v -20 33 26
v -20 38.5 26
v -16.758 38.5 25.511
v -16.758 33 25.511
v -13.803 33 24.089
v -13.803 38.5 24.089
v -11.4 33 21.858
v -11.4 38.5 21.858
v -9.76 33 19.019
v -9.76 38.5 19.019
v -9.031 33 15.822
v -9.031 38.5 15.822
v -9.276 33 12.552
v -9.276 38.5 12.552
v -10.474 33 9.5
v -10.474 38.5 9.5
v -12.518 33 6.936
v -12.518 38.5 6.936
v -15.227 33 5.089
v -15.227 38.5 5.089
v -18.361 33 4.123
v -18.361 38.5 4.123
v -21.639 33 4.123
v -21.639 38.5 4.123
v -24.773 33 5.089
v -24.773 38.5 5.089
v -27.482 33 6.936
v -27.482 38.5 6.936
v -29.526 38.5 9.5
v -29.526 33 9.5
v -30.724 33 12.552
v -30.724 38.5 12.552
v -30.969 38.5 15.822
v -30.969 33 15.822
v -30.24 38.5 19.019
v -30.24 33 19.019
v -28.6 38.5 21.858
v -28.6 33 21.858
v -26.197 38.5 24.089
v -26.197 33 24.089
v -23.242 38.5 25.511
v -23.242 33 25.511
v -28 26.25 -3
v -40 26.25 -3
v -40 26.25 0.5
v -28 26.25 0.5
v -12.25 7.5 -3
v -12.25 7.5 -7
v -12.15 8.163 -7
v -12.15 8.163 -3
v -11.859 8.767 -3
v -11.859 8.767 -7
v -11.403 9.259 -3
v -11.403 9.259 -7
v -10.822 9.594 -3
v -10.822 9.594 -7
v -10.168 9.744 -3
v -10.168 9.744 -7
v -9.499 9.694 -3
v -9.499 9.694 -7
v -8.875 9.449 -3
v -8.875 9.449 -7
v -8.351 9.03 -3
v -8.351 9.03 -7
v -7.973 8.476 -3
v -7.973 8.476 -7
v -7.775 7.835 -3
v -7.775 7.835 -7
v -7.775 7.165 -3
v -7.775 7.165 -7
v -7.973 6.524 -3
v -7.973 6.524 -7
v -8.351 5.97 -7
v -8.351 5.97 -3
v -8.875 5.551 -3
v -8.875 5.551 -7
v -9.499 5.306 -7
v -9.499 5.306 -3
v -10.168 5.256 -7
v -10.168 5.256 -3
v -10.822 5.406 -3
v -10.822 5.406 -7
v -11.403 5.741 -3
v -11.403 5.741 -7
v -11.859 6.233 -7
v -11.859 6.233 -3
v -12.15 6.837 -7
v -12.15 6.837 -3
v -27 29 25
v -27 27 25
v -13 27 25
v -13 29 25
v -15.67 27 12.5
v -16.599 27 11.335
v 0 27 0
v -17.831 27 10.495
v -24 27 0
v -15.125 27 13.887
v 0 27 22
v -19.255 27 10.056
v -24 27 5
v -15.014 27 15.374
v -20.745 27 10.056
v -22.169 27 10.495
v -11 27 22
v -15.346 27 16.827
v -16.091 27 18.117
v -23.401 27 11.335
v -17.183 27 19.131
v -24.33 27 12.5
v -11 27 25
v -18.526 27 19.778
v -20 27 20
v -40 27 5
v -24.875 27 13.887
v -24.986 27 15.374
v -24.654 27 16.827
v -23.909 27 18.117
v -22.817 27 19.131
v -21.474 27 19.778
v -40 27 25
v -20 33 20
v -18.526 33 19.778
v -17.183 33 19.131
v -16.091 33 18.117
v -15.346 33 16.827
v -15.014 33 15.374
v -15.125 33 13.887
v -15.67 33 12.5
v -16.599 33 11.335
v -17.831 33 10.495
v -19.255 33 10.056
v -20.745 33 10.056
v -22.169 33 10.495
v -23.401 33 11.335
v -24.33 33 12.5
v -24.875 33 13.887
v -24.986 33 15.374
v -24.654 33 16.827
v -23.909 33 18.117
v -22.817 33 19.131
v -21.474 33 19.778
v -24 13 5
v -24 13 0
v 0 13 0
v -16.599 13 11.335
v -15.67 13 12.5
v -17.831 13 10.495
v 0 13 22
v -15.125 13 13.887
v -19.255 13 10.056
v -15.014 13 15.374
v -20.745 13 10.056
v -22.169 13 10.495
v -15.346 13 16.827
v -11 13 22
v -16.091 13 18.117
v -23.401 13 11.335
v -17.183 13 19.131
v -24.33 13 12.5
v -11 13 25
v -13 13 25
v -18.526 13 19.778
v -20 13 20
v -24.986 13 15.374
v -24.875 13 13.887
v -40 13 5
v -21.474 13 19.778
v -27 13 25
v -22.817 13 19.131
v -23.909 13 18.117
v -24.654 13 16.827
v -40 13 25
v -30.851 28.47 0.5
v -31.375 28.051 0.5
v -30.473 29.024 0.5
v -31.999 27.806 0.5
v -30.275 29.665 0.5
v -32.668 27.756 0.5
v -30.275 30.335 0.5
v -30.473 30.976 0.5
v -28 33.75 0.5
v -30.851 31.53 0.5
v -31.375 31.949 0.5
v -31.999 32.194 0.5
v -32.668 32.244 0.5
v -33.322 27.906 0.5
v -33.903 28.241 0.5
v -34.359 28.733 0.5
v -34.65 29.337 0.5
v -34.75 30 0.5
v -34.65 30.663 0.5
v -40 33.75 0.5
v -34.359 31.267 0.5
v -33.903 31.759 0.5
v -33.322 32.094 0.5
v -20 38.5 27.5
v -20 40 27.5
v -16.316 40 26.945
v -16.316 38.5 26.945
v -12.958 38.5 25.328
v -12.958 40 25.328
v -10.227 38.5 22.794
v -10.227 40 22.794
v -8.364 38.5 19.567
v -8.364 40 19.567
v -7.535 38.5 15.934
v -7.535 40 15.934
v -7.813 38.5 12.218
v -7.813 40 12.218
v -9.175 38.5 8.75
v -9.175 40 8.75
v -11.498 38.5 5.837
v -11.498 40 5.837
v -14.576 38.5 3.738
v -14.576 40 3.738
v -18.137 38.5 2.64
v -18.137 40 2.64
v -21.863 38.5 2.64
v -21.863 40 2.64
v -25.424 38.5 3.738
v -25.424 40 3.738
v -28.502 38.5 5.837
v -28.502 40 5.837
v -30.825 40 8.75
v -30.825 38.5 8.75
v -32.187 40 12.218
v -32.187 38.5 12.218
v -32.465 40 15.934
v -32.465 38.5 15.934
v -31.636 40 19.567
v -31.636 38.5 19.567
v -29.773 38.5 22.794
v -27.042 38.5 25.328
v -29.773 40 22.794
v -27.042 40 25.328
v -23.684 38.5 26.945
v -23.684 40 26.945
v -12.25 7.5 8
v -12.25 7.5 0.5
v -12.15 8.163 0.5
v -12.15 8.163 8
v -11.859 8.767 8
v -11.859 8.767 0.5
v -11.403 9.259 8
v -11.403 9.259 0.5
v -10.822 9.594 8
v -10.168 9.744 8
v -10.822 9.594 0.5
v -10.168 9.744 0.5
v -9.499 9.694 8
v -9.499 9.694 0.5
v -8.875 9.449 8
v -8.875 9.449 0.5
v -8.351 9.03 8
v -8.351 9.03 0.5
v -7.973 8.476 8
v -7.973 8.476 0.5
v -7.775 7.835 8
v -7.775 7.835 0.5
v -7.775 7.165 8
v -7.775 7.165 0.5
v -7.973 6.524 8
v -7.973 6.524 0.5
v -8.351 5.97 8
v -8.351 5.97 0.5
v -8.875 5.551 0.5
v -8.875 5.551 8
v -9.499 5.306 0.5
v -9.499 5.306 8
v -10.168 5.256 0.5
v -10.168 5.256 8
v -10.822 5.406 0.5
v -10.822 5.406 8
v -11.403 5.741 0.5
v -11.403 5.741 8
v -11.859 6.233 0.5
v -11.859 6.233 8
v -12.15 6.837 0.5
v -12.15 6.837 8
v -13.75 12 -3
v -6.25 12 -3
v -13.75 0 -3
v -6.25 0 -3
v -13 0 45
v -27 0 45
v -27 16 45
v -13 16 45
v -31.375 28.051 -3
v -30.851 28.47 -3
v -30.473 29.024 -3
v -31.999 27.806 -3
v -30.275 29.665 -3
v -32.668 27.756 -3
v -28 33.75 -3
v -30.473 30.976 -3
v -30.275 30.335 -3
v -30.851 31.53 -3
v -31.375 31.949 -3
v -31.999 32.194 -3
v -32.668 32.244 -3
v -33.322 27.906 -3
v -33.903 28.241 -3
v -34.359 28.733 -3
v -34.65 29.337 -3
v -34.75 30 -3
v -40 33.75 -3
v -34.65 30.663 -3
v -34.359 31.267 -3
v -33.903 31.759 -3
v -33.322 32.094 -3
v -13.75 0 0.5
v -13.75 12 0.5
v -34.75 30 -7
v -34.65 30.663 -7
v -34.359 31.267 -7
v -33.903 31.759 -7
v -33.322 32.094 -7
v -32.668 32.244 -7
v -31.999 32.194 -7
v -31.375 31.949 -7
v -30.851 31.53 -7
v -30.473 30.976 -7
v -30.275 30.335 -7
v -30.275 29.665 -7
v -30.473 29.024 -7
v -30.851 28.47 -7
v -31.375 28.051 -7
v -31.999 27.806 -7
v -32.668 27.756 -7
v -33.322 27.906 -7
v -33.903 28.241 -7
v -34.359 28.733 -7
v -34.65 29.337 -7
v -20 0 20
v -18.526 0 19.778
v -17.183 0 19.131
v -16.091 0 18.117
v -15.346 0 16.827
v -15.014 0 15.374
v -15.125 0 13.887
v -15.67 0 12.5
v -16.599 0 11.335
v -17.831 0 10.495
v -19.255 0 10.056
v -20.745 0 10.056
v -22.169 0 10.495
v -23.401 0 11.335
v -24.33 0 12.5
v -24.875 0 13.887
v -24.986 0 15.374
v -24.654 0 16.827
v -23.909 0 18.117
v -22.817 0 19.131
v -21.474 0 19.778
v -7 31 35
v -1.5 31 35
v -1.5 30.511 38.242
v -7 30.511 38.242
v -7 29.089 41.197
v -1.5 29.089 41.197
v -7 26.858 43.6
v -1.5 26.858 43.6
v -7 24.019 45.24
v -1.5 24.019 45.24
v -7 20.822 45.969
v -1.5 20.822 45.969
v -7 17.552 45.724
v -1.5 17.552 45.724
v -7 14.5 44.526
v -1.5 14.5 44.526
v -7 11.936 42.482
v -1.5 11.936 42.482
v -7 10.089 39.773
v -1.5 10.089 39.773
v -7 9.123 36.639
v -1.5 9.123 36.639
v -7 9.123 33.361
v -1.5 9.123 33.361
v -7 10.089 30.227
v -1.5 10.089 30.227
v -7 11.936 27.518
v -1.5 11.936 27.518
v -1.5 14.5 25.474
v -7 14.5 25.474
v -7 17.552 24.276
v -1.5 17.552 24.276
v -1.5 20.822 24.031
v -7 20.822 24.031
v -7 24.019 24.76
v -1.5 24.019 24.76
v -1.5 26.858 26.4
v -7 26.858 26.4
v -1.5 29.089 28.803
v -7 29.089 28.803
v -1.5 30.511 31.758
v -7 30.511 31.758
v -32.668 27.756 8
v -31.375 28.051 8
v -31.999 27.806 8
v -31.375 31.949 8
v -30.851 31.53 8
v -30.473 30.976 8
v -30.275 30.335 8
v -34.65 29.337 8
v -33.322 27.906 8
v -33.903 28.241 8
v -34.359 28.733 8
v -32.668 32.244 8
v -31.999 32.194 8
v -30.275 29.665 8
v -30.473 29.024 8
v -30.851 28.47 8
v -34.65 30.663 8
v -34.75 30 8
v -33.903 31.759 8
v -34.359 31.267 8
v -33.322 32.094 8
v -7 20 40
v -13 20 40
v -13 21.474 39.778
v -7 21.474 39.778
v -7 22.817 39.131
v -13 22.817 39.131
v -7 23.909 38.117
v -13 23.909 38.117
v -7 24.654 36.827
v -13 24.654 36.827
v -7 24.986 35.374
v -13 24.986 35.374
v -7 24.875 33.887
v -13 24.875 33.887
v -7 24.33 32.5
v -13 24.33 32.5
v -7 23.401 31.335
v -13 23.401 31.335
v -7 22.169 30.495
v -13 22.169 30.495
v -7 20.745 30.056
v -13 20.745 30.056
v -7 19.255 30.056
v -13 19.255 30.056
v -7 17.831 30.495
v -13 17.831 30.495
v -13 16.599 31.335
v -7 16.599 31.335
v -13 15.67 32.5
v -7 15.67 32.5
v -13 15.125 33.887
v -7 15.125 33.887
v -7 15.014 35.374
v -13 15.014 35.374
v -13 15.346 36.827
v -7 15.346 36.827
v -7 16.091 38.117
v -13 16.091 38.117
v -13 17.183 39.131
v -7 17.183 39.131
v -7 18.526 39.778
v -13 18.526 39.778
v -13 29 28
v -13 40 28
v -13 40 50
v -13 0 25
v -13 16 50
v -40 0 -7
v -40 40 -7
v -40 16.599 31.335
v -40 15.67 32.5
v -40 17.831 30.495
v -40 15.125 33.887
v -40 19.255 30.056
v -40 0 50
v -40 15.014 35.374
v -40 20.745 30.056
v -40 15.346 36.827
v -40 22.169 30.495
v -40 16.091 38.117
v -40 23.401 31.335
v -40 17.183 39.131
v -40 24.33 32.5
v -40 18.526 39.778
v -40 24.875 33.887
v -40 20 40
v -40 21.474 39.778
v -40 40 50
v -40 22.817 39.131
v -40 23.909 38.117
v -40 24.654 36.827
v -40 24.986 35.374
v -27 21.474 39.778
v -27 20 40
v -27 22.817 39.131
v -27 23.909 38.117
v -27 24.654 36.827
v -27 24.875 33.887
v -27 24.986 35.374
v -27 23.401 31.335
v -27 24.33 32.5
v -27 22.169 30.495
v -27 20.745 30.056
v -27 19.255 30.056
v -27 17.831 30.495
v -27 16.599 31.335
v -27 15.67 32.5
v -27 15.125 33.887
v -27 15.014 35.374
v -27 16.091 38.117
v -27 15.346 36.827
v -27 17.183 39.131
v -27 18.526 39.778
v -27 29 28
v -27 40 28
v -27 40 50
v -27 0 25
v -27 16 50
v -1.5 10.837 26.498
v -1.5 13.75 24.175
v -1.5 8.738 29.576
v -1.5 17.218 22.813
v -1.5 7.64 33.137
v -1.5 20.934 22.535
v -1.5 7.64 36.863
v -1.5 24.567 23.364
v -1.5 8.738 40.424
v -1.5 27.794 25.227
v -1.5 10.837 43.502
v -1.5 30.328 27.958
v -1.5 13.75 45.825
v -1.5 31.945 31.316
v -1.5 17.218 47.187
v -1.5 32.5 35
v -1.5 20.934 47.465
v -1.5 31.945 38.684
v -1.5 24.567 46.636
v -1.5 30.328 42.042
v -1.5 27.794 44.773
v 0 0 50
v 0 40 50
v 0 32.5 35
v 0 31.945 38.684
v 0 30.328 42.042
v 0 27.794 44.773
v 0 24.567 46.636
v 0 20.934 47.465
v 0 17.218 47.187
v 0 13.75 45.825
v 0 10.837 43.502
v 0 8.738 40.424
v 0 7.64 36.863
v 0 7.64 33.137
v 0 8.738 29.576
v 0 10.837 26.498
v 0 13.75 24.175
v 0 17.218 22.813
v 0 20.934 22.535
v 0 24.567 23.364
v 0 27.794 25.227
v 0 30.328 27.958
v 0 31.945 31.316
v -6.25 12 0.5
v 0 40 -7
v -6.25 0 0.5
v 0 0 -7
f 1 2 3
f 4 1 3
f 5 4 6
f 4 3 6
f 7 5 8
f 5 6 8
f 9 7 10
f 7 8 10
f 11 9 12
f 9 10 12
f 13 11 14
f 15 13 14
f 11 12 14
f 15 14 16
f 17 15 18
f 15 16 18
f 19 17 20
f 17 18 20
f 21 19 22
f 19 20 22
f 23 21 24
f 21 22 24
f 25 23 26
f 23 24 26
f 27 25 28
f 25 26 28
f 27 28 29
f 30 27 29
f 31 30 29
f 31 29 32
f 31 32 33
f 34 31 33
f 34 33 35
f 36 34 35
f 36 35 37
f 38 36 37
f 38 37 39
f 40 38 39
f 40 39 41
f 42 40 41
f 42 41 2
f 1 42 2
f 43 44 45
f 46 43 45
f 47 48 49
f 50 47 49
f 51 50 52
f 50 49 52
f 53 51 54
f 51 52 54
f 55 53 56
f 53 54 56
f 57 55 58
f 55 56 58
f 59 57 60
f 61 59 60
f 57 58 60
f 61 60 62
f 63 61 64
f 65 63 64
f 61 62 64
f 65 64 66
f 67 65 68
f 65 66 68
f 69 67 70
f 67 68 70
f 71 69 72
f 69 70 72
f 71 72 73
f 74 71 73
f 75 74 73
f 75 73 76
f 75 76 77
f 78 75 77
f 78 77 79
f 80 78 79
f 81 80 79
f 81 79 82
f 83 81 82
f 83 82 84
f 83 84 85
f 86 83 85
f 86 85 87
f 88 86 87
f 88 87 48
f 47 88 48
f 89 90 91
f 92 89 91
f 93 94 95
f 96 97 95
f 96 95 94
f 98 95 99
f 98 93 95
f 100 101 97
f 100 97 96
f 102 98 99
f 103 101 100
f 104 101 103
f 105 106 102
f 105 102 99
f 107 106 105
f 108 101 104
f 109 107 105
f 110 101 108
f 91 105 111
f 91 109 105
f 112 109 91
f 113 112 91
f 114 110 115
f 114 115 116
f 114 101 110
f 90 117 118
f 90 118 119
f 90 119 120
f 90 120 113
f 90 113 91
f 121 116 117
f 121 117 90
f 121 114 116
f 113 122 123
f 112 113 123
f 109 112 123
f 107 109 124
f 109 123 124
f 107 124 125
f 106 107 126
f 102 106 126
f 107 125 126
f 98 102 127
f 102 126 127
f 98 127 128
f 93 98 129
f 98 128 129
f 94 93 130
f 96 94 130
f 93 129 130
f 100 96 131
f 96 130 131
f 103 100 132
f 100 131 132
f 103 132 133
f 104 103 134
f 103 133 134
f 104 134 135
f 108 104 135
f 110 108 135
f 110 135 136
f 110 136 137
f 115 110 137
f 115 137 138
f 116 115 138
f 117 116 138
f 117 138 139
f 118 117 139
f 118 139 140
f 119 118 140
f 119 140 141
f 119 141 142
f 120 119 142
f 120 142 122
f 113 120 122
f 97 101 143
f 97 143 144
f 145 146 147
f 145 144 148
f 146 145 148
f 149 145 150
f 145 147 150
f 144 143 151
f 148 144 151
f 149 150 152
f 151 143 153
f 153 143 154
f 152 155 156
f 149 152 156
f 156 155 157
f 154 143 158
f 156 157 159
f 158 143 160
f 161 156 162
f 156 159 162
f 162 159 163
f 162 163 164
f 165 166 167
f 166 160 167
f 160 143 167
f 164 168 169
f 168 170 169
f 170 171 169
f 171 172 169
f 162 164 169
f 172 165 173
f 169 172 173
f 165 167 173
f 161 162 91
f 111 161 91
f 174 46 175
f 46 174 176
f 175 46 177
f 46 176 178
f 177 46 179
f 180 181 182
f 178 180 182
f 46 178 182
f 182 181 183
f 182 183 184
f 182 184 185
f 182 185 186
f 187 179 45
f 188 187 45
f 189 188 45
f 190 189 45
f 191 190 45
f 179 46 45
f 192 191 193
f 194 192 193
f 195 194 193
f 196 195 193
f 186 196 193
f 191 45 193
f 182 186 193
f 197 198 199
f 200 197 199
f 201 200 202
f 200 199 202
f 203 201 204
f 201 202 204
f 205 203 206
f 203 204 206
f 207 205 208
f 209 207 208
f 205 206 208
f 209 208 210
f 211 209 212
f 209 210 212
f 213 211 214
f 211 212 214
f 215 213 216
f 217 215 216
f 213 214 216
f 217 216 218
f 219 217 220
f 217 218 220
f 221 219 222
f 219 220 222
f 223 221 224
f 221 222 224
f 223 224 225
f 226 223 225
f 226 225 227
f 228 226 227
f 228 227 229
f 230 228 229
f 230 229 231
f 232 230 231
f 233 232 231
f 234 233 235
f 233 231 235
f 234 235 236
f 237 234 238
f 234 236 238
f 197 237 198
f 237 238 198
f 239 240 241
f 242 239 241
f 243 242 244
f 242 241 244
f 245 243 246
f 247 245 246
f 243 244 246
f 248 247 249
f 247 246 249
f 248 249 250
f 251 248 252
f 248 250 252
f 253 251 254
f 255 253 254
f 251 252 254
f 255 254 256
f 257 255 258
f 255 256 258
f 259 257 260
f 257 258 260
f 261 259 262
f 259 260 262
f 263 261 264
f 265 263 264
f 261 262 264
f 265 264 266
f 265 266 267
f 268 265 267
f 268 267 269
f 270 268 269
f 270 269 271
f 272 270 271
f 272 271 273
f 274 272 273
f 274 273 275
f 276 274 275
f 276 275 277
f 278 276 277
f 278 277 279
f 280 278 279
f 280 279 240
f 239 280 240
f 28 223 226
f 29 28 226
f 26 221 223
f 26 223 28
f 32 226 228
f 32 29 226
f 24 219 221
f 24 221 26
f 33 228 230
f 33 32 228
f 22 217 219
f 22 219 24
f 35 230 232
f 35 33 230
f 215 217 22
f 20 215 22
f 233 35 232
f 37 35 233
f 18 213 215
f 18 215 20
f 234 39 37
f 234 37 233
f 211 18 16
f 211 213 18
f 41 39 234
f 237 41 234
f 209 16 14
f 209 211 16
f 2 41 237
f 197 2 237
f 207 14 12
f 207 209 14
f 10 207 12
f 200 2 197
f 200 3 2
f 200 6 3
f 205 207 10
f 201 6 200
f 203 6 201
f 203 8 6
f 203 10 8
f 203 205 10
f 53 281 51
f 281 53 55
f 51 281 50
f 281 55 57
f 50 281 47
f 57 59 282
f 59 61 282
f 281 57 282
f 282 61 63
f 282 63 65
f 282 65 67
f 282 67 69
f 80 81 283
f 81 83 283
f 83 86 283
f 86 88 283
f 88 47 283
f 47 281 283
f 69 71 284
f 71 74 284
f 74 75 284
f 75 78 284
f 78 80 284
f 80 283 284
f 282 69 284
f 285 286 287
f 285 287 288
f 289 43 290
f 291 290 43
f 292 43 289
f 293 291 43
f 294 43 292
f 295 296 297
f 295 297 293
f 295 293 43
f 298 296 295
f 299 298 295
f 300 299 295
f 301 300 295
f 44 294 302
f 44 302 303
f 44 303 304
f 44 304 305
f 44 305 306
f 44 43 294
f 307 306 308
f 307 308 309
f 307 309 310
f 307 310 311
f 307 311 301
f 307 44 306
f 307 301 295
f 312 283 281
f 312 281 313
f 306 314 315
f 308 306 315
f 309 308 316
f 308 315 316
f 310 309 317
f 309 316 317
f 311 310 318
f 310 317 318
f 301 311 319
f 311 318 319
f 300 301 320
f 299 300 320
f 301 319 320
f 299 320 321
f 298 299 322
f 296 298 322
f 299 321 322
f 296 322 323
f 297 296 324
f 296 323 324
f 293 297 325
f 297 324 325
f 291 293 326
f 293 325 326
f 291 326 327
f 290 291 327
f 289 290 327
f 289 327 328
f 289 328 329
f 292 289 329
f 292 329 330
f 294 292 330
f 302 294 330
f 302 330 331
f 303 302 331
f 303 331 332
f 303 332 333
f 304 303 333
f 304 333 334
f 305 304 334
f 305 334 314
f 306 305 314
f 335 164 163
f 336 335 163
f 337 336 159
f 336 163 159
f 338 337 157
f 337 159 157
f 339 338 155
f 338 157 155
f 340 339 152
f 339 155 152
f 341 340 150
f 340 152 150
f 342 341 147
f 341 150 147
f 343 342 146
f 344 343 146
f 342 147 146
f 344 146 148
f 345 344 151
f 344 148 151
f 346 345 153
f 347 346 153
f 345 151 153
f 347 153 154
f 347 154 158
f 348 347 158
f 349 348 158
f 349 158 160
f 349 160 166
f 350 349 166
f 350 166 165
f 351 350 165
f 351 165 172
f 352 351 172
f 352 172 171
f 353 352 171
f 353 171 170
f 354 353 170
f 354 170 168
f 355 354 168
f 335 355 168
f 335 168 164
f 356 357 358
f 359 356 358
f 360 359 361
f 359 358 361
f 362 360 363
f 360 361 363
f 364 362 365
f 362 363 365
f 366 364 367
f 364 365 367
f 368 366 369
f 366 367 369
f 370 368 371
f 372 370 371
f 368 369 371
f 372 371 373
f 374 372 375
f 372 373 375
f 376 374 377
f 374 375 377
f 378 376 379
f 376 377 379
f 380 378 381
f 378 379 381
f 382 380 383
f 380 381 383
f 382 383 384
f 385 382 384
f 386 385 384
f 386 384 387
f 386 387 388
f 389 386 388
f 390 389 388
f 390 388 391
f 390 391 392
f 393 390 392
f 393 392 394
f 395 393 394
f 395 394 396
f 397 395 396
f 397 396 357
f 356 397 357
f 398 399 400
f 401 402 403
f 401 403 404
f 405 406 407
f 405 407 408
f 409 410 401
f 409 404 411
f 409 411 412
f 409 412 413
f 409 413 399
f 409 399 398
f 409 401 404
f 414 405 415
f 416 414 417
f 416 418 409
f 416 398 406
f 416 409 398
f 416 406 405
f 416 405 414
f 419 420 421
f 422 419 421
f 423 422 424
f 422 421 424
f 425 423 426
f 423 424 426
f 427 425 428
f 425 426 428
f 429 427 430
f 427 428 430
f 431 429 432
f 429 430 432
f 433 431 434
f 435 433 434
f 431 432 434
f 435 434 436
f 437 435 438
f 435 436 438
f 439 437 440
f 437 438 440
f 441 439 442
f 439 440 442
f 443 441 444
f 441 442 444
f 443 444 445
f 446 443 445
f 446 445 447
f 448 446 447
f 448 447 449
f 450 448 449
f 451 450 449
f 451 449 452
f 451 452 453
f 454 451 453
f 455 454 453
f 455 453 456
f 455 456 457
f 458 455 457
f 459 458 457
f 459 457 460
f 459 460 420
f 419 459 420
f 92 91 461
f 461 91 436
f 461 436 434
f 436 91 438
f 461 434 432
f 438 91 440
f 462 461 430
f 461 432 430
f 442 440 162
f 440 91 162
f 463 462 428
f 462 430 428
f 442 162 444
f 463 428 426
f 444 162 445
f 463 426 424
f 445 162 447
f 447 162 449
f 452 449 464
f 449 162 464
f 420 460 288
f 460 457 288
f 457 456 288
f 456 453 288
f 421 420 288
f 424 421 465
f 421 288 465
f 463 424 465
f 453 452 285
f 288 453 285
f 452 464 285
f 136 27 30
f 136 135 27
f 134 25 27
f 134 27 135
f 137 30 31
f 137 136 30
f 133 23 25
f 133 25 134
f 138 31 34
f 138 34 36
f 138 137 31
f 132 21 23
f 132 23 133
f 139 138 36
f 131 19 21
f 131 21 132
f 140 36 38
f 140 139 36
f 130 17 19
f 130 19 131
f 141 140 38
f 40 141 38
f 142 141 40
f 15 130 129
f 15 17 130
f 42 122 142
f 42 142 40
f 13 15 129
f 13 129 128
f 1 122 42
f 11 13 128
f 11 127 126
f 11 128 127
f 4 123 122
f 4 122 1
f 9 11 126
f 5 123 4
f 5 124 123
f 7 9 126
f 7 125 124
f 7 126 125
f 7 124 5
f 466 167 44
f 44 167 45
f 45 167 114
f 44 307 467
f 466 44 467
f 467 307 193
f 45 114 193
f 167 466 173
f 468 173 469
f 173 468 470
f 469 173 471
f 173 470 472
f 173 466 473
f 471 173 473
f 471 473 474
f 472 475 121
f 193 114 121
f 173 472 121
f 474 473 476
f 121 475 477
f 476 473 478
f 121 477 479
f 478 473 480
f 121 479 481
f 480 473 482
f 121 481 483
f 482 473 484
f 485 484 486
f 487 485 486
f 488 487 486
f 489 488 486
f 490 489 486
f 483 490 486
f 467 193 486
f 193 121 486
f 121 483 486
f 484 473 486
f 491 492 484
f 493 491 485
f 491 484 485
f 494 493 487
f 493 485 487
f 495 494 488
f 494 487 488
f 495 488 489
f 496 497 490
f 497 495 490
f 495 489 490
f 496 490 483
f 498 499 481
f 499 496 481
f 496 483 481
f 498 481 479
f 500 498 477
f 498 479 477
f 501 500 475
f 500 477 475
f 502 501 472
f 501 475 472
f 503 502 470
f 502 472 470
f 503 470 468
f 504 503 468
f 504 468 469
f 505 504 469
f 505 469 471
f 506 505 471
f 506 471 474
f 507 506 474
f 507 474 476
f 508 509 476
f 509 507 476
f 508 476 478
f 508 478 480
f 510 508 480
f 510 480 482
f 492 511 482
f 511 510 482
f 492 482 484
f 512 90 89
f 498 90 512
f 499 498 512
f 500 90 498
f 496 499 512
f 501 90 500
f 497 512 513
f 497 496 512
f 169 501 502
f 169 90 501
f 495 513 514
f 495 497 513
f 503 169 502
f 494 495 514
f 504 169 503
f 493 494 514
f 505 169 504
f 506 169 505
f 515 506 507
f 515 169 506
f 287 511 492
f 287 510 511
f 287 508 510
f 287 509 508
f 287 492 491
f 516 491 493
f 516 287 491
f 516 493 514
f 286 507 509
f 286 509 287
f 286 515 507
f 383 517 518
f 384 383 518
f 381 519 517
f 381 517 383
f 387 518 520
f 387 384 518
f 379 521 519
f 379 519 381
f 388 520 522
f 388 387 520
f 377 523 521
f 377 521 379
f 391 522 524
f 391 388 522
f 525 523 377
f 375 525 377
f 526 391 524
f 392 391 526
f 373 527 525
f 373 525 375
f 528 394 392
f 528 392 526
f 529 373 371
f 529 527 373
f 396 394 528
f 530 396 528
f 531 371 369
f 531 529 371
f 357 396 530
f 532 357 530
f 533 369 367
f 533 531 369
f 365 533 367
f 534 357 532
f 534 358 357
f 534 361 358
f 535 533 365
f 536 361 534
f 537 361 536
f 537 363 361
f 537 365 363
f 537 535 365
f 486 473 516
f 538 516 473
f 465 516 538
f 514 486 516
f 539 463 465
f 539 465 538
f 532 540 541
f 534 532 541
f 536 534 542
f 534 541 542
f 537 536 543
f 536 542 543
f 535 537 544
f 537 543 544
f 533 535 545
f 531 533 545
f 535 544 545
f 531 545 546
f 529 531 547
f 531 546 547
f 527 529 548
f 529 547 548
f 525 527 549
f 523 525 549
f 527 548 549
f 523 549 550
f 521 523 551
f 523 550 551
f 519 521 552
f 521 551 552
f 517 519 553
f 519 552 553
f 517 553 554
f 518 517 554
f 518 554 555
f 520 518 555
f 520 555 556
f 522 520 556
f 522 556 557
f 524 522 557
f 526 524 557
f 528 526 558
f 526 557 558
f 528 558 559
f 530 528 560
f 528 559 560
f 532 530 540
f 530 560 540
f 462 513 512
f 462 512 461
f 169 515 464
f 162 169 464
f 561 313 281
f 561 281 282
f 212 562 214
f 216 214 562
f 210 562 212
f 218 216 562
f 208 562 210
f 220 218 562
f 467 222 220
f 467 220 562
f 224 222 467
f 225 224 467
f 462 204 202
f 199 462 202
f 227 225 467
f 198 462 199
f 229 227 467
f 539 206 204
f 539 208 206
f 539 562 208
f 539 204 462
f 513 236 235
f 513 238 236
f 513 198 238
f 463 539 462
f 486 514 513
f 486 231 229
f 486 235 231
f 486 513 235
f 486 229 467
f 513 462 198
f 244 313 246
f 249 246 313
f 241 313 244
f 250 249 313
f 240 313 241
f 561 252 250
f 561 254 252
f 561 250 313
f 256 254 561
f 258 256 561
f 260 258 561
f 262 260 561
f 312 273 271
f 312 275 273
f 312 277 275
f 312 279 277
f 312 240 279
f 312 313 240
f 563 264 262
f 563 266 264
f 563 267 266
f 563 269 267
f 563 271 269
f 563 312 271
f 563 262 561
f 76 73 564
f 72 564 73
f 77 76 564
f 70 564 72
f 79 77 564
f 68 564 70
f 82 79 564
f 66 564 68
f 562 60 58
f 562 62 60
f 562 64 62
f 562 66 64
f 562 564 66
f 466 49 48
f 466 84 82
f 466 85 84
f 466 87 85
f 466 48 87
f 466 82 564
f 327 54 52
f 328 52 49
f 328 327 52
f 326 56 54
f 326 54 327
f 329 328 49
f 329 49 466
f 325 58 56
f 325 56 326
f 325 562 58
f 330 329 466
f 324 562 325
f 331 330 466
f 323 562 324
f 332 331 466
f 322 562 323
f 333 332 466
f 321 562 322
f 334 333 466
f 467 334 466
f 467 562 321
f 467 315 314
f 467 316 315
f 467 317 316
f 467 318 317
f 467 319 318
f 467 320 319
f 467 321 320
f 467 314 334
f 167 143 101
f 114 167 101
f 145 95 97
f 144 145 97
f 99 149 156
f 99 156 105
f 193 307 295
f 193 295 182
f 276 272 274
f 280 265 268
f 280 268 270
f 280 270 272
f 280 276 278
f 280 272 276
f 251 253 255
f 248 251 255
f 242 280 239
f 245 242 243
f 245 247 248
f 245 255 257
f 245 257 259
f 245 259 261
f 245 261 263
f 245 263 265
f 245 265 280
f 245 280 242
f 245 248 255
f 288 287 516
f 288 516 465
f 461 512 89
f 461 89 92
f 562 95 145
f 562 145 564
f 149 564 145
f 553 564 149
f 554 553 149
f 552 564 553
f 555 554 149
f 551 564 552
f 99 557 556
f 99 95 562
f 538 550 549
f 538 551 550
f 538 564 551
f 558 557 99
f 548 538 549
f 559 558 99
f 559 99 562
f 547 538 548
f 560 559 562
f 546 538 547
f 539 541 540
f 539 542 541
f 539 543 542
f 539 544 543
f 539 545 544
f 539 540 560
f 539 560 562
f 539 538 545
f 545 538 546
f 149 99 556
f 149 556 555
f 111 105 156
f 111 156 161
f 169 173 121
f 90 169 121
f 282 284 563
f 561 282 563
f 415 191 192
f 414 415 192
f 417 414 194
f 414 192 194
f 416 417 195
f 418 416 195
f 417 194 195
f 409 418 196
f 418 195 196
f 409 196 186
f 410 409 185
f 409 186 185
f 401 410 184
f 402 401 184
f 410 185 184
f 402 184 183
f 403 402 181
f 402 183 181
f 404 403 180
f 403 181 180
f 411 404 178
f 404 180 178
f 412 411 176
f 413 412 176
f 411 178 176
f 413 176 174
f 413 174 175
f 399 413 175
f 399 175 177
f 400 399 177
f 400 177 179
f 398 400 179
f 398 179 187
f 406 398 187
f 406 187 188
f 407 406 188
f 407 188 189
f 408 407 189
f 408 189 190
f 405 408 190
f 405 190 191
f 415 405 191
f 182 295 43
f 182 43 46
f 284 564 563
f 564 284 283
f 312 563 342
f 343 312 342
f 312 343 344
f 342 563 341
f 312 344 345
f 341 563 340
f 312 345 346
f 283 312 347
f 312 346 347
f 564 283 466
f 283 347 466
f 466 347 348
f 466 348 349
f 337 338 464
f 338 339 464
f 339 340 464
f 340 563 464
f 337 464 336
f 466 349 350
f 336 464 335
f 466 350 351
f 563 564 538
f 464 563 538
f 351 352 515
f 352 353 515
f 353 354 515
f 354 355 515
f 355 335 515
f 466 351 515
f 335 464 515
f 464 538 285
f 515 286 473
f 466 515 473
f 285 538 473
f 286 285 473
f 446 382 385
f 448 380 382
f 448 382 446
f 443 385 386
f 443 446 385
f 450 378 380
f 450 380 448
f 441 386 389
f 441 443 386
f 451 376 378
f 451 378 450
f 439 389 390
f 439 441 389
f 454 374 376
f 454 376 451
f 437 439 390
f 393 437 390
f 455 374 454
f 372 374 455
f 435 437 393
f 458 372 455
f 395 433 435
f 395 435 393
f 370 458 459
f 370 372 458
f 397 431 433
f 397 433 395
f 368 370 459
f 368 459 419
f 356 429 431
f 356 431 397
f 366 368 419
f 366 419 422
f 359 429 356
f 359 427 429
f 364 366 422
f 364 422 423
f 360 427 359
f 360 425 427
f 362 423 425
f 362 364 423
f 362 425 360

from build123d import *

# Parameters (mm, degrees)
ESQUISSE1_W              = 40
ESQUISSE1_H              = 40
BOSS_EXTRU_1_DEPTH       = 50
ESQUISSE2_R              = 5
ENL_V_MAT_EXTRU_1_DEPTH  = 41
ESQUISSE3_R              = 5
ENL_V_MAT_EXTRU_2_DEPTH  = 41
ESQUISSE4_W              = 20
ESQUISSE4_H              = 14
ENL_V_MAT_EXTRU_3_DEPTH  = 29
ESQUISSE5_W              = 14
ESQUISSE5_H              = 20
ENL_V_MAT_EXTRU_4_DEPTH  = 29
ESQUISSE6_W              = 22
ESQUISSE6_H              = 14
ENL_V_MAT_EXTRU_5_DEPTH  = 24
ESQUISSE7_W              = 14
ESQUISSE7_H              = 22
ENL_V_MAT_EXTRU_6_DEPTH  = 24
ESQUISSE8_R              = 11
ENL_V_MAT_EXTRU_7_DEPTH  = 7
ESQUISSE9_R              = 12.5
ENL_V_MAT_EXTRU_8_DEPTH  = 1.5
ESQUISSE10_R             = 11
ENL_V_MAT_EXTRU_9_DEPTH  = 7
ESQUISSE11_R             = 12.5
ENL_V_MAT_EXTRU_10_DEPTH = 1.5
ESQUISSE12_W             = 40
ESQUISSE12_H             = 40
BOSS_EXTRU_2_DEPTH       = 7
ESQUISSE13_R             = 2.25
ENL_V_MAT_EXTRU_11_DEPTH = 15
ESQUISSE14_W             = 3.5
ESQUISSE14_H             = 7.5
ENL_V_MAT_EXTRU_12_DEPTH = 12
ESQUISSE15_W             = 7.5
ESQUISSE15_H             = 3.5
ENL_V_MAT_EXTRU_13_DEPTH = 12


with BuildPart() as part:
    # Esquisse1 → Boss.-Extru.1 (new body)
    with BuildSketch(Plane.XY):
        with Locations((-20, 20)):
            Rectangle(ESQUISSE1_W, ESQUISSE1_H)
    extrude(amount=BOSS_EXTRU_1_DEPTH)

    # Esquisse2 → Enlèv. mat.-Extru.1 (cut, through all)
    with BuildSketch(Plane(origin=(0, 40, 0), x_dir=(1, 0, 0), z_dir=(0, 1, 0))):
        with Locations(Location((-20, -15, 0), (0, 0, 270))):  # turned: the seam where the file's is
            Circle(ESQUISSE2_R)
    extrude(amount=-ENL_V_MAT_EXTRU_1_DEPTH, mode=Mode.SUBTRACT)

    # Esquisse3 → Enlèv. mat.-Extru.2 (cut, through all)
    with BuildSketch(Plane.ZY.offset(40)):
        with Locations((35, 20)):
            Circle(ESQUISSE3_R)
    extrude(amount=-ENL_V_MAT_EXTRU_2_DEPTH, mode=Mode.SUBTRACT)

    # Esquisse4 → Enlèv. mat.-Extru.3 (cut)
    with BuildSketch(Plane.ZY.offset(40)):
        with Locations((15, 20)):
            Rectangle(ESQUISSE4_W, ESQUISSE4_H)
    extrude(amount=-ENL_V_MAT_EXTRU_3_DEPTH, mode=Mode.SUBTRACT)

    # Esquisse5 → Enlèv. mat.-Extru.4 (cut)
    with BuildSketch(Plane.XZ):
        with Locations((-20, 35)):
            Rectangle(ESQUISSE5_W, ESQUISSE5_H)
    extrude(amount=-ENL_V_MAT_EXTRU_4_DEPTH, mode=Mode.SUBTRACT)

    # Esquisse6 → Enlèv. mat.-Extru.5 (cut)
    with BuildSketch(Plane(origin=(0, 0, 0), x_dir=(0, 0, -1), z_dir=(1, 0, 0))):
        with Locations((-11, 20)):
            Rectangle(ESQUISSE6_W, ESQUISSE6_H)
    extrude(amount=-ENL_V_MAT_EXTRU_5_DEPTH, mode=Mode.SUBTRACT)

    # Esquisse7 → Enlèv. mat.-Extru.6 (cut)
    with BuildSketch(Plane(origin=(0, 40, 0), x_dir=(1, 0, 0), z_dir=(0, 1, 0))):
        with Locations((-20, -39)):
            Rectangle(ESQUISSE7_W, ESQUISSE7_H)
    extrude(amount=-ENL_V_MAT_EXTRU_6_DEPTH, mode=Mode.SUBTRACT)

    # Esquisse8 → Enlèv. mat.-Extru.7 (cut)
    with BuildSketch(Plane(origin=(0, 0, 0), x_dir=(0, 0, -1), z_dir=(1, 0, 0))):
        with Locations(Location((-35, 20, 0), (0, 0, 90))):  # turned: the seam where the file's is
            Circle(ESQUISSE8_R)
    extrude(amount=-ENL_V_MAT_EXTRU_7_DEPTH, mode=Mode.SUBTRACT)

    # Esquisse9 → Enlèv. mat.-Extru.8 (cut)
    with BuildSketch(Plane(origin=(0, 0, 0), x_dir=(0, 0, -1), z_dir=(1, 0, 0))):
        with Locations(Location((-35, 20, 0), (0, 0, 90))):  # turned: the seam where the file's is
            Circle(ESQUISSE9_R)
    extrude(amount=-ENL_V_MAT_EXTRU_8_DEPTH, mode=Mode.SUBTRACT)

    # Esquisse10 → Enlèv. mat.-Extru.9 (cut)
    with BuildSketch(Plane(origin=(0, 40, 0), x_dir=(1, 0, 0), z_dir=(0, 1, 0))):
        with Locations(Location((-20, -15, 0), (0, 0, 270))):  # turned: the seam where the file's is
            Circle(ESQUISSE10_R)
    extrude(amount=-ENL_V_MAT_EXTRU_9_DEPTH, mode=Mode.SUBTRACT)

    # Esquisse11 → Enlèv. mat.-Extru.10 (cut)
    with BuildSketch(Plane(origin=(0, 40, 0), x_dir=(1, 0, 0), z_dir=(0, 1, 0))):
        with Locations(Location((-20, -15, 0), (0, 0, 270))):  # turned: the seam where the file's is
            Circle(ESQUISSE11_R)
    extrude(amount=-ENL_V_MAT_EXTRU_10_DEPTH, mode=Mode.SUBTRACT)

    # Esquisse12 → Boss.-Extru.2 (add)
    with BuildSketch(Plane(origin=(0, 0, 0), x_dir=(-1, 0, 0), z_dir=(0, 0, -1))):
        with Locations((20, 20)):
            Rectangle(ESQUISSE12_W, ESQUISSE12_H)
    extrude(amount=BOSS_EXTRU_2_DEPTH)

    # Esquisse13 → Enlèv. mat.-Extru.11 (cut)
    with BuildSketch(Plane(origin=(0, 0, -7), x_dir=(-1, 0, 0), z_dir=(0, 0, -1))):
        with Locations((10, 7.5)):
            Circle(ESQUISSE13_R)
        with Locations((32.5, 30)):
            Circle(ESQUISSE13_R)
    extrude(amount=-ENL_V_MAT_EXTRU_11_DEPTH, mode=Mode.SUBTRACT)

    # Esquisse14 → Enlèv. mat.-Extru.12 (cut)
    with BuildSketch(Plane.ZY.offset(40)):
        with Locations((-1.25, 30)):
            Rectangle(ESQUISSE14_W, ESQUISSE14_H)
    extrude(amount=-ENL_V_MAT_EXTRU_12_DEPTH, mode=Mode.SUBTRACT)

    # Esquisse15 → Enlèv. mat.-Extru.13 (cut)
    with BuildSketch(Plane.XZ):
        with Locations((-10, -1.25)):
            Rectangle(ESQUISSE15_W, ESQUISSE15_H)
    extrude(amount=-ENL_V_MAT_EXTRU_13_DEPTH, mode=Mode.SUBTRACT)


solid = part.part
